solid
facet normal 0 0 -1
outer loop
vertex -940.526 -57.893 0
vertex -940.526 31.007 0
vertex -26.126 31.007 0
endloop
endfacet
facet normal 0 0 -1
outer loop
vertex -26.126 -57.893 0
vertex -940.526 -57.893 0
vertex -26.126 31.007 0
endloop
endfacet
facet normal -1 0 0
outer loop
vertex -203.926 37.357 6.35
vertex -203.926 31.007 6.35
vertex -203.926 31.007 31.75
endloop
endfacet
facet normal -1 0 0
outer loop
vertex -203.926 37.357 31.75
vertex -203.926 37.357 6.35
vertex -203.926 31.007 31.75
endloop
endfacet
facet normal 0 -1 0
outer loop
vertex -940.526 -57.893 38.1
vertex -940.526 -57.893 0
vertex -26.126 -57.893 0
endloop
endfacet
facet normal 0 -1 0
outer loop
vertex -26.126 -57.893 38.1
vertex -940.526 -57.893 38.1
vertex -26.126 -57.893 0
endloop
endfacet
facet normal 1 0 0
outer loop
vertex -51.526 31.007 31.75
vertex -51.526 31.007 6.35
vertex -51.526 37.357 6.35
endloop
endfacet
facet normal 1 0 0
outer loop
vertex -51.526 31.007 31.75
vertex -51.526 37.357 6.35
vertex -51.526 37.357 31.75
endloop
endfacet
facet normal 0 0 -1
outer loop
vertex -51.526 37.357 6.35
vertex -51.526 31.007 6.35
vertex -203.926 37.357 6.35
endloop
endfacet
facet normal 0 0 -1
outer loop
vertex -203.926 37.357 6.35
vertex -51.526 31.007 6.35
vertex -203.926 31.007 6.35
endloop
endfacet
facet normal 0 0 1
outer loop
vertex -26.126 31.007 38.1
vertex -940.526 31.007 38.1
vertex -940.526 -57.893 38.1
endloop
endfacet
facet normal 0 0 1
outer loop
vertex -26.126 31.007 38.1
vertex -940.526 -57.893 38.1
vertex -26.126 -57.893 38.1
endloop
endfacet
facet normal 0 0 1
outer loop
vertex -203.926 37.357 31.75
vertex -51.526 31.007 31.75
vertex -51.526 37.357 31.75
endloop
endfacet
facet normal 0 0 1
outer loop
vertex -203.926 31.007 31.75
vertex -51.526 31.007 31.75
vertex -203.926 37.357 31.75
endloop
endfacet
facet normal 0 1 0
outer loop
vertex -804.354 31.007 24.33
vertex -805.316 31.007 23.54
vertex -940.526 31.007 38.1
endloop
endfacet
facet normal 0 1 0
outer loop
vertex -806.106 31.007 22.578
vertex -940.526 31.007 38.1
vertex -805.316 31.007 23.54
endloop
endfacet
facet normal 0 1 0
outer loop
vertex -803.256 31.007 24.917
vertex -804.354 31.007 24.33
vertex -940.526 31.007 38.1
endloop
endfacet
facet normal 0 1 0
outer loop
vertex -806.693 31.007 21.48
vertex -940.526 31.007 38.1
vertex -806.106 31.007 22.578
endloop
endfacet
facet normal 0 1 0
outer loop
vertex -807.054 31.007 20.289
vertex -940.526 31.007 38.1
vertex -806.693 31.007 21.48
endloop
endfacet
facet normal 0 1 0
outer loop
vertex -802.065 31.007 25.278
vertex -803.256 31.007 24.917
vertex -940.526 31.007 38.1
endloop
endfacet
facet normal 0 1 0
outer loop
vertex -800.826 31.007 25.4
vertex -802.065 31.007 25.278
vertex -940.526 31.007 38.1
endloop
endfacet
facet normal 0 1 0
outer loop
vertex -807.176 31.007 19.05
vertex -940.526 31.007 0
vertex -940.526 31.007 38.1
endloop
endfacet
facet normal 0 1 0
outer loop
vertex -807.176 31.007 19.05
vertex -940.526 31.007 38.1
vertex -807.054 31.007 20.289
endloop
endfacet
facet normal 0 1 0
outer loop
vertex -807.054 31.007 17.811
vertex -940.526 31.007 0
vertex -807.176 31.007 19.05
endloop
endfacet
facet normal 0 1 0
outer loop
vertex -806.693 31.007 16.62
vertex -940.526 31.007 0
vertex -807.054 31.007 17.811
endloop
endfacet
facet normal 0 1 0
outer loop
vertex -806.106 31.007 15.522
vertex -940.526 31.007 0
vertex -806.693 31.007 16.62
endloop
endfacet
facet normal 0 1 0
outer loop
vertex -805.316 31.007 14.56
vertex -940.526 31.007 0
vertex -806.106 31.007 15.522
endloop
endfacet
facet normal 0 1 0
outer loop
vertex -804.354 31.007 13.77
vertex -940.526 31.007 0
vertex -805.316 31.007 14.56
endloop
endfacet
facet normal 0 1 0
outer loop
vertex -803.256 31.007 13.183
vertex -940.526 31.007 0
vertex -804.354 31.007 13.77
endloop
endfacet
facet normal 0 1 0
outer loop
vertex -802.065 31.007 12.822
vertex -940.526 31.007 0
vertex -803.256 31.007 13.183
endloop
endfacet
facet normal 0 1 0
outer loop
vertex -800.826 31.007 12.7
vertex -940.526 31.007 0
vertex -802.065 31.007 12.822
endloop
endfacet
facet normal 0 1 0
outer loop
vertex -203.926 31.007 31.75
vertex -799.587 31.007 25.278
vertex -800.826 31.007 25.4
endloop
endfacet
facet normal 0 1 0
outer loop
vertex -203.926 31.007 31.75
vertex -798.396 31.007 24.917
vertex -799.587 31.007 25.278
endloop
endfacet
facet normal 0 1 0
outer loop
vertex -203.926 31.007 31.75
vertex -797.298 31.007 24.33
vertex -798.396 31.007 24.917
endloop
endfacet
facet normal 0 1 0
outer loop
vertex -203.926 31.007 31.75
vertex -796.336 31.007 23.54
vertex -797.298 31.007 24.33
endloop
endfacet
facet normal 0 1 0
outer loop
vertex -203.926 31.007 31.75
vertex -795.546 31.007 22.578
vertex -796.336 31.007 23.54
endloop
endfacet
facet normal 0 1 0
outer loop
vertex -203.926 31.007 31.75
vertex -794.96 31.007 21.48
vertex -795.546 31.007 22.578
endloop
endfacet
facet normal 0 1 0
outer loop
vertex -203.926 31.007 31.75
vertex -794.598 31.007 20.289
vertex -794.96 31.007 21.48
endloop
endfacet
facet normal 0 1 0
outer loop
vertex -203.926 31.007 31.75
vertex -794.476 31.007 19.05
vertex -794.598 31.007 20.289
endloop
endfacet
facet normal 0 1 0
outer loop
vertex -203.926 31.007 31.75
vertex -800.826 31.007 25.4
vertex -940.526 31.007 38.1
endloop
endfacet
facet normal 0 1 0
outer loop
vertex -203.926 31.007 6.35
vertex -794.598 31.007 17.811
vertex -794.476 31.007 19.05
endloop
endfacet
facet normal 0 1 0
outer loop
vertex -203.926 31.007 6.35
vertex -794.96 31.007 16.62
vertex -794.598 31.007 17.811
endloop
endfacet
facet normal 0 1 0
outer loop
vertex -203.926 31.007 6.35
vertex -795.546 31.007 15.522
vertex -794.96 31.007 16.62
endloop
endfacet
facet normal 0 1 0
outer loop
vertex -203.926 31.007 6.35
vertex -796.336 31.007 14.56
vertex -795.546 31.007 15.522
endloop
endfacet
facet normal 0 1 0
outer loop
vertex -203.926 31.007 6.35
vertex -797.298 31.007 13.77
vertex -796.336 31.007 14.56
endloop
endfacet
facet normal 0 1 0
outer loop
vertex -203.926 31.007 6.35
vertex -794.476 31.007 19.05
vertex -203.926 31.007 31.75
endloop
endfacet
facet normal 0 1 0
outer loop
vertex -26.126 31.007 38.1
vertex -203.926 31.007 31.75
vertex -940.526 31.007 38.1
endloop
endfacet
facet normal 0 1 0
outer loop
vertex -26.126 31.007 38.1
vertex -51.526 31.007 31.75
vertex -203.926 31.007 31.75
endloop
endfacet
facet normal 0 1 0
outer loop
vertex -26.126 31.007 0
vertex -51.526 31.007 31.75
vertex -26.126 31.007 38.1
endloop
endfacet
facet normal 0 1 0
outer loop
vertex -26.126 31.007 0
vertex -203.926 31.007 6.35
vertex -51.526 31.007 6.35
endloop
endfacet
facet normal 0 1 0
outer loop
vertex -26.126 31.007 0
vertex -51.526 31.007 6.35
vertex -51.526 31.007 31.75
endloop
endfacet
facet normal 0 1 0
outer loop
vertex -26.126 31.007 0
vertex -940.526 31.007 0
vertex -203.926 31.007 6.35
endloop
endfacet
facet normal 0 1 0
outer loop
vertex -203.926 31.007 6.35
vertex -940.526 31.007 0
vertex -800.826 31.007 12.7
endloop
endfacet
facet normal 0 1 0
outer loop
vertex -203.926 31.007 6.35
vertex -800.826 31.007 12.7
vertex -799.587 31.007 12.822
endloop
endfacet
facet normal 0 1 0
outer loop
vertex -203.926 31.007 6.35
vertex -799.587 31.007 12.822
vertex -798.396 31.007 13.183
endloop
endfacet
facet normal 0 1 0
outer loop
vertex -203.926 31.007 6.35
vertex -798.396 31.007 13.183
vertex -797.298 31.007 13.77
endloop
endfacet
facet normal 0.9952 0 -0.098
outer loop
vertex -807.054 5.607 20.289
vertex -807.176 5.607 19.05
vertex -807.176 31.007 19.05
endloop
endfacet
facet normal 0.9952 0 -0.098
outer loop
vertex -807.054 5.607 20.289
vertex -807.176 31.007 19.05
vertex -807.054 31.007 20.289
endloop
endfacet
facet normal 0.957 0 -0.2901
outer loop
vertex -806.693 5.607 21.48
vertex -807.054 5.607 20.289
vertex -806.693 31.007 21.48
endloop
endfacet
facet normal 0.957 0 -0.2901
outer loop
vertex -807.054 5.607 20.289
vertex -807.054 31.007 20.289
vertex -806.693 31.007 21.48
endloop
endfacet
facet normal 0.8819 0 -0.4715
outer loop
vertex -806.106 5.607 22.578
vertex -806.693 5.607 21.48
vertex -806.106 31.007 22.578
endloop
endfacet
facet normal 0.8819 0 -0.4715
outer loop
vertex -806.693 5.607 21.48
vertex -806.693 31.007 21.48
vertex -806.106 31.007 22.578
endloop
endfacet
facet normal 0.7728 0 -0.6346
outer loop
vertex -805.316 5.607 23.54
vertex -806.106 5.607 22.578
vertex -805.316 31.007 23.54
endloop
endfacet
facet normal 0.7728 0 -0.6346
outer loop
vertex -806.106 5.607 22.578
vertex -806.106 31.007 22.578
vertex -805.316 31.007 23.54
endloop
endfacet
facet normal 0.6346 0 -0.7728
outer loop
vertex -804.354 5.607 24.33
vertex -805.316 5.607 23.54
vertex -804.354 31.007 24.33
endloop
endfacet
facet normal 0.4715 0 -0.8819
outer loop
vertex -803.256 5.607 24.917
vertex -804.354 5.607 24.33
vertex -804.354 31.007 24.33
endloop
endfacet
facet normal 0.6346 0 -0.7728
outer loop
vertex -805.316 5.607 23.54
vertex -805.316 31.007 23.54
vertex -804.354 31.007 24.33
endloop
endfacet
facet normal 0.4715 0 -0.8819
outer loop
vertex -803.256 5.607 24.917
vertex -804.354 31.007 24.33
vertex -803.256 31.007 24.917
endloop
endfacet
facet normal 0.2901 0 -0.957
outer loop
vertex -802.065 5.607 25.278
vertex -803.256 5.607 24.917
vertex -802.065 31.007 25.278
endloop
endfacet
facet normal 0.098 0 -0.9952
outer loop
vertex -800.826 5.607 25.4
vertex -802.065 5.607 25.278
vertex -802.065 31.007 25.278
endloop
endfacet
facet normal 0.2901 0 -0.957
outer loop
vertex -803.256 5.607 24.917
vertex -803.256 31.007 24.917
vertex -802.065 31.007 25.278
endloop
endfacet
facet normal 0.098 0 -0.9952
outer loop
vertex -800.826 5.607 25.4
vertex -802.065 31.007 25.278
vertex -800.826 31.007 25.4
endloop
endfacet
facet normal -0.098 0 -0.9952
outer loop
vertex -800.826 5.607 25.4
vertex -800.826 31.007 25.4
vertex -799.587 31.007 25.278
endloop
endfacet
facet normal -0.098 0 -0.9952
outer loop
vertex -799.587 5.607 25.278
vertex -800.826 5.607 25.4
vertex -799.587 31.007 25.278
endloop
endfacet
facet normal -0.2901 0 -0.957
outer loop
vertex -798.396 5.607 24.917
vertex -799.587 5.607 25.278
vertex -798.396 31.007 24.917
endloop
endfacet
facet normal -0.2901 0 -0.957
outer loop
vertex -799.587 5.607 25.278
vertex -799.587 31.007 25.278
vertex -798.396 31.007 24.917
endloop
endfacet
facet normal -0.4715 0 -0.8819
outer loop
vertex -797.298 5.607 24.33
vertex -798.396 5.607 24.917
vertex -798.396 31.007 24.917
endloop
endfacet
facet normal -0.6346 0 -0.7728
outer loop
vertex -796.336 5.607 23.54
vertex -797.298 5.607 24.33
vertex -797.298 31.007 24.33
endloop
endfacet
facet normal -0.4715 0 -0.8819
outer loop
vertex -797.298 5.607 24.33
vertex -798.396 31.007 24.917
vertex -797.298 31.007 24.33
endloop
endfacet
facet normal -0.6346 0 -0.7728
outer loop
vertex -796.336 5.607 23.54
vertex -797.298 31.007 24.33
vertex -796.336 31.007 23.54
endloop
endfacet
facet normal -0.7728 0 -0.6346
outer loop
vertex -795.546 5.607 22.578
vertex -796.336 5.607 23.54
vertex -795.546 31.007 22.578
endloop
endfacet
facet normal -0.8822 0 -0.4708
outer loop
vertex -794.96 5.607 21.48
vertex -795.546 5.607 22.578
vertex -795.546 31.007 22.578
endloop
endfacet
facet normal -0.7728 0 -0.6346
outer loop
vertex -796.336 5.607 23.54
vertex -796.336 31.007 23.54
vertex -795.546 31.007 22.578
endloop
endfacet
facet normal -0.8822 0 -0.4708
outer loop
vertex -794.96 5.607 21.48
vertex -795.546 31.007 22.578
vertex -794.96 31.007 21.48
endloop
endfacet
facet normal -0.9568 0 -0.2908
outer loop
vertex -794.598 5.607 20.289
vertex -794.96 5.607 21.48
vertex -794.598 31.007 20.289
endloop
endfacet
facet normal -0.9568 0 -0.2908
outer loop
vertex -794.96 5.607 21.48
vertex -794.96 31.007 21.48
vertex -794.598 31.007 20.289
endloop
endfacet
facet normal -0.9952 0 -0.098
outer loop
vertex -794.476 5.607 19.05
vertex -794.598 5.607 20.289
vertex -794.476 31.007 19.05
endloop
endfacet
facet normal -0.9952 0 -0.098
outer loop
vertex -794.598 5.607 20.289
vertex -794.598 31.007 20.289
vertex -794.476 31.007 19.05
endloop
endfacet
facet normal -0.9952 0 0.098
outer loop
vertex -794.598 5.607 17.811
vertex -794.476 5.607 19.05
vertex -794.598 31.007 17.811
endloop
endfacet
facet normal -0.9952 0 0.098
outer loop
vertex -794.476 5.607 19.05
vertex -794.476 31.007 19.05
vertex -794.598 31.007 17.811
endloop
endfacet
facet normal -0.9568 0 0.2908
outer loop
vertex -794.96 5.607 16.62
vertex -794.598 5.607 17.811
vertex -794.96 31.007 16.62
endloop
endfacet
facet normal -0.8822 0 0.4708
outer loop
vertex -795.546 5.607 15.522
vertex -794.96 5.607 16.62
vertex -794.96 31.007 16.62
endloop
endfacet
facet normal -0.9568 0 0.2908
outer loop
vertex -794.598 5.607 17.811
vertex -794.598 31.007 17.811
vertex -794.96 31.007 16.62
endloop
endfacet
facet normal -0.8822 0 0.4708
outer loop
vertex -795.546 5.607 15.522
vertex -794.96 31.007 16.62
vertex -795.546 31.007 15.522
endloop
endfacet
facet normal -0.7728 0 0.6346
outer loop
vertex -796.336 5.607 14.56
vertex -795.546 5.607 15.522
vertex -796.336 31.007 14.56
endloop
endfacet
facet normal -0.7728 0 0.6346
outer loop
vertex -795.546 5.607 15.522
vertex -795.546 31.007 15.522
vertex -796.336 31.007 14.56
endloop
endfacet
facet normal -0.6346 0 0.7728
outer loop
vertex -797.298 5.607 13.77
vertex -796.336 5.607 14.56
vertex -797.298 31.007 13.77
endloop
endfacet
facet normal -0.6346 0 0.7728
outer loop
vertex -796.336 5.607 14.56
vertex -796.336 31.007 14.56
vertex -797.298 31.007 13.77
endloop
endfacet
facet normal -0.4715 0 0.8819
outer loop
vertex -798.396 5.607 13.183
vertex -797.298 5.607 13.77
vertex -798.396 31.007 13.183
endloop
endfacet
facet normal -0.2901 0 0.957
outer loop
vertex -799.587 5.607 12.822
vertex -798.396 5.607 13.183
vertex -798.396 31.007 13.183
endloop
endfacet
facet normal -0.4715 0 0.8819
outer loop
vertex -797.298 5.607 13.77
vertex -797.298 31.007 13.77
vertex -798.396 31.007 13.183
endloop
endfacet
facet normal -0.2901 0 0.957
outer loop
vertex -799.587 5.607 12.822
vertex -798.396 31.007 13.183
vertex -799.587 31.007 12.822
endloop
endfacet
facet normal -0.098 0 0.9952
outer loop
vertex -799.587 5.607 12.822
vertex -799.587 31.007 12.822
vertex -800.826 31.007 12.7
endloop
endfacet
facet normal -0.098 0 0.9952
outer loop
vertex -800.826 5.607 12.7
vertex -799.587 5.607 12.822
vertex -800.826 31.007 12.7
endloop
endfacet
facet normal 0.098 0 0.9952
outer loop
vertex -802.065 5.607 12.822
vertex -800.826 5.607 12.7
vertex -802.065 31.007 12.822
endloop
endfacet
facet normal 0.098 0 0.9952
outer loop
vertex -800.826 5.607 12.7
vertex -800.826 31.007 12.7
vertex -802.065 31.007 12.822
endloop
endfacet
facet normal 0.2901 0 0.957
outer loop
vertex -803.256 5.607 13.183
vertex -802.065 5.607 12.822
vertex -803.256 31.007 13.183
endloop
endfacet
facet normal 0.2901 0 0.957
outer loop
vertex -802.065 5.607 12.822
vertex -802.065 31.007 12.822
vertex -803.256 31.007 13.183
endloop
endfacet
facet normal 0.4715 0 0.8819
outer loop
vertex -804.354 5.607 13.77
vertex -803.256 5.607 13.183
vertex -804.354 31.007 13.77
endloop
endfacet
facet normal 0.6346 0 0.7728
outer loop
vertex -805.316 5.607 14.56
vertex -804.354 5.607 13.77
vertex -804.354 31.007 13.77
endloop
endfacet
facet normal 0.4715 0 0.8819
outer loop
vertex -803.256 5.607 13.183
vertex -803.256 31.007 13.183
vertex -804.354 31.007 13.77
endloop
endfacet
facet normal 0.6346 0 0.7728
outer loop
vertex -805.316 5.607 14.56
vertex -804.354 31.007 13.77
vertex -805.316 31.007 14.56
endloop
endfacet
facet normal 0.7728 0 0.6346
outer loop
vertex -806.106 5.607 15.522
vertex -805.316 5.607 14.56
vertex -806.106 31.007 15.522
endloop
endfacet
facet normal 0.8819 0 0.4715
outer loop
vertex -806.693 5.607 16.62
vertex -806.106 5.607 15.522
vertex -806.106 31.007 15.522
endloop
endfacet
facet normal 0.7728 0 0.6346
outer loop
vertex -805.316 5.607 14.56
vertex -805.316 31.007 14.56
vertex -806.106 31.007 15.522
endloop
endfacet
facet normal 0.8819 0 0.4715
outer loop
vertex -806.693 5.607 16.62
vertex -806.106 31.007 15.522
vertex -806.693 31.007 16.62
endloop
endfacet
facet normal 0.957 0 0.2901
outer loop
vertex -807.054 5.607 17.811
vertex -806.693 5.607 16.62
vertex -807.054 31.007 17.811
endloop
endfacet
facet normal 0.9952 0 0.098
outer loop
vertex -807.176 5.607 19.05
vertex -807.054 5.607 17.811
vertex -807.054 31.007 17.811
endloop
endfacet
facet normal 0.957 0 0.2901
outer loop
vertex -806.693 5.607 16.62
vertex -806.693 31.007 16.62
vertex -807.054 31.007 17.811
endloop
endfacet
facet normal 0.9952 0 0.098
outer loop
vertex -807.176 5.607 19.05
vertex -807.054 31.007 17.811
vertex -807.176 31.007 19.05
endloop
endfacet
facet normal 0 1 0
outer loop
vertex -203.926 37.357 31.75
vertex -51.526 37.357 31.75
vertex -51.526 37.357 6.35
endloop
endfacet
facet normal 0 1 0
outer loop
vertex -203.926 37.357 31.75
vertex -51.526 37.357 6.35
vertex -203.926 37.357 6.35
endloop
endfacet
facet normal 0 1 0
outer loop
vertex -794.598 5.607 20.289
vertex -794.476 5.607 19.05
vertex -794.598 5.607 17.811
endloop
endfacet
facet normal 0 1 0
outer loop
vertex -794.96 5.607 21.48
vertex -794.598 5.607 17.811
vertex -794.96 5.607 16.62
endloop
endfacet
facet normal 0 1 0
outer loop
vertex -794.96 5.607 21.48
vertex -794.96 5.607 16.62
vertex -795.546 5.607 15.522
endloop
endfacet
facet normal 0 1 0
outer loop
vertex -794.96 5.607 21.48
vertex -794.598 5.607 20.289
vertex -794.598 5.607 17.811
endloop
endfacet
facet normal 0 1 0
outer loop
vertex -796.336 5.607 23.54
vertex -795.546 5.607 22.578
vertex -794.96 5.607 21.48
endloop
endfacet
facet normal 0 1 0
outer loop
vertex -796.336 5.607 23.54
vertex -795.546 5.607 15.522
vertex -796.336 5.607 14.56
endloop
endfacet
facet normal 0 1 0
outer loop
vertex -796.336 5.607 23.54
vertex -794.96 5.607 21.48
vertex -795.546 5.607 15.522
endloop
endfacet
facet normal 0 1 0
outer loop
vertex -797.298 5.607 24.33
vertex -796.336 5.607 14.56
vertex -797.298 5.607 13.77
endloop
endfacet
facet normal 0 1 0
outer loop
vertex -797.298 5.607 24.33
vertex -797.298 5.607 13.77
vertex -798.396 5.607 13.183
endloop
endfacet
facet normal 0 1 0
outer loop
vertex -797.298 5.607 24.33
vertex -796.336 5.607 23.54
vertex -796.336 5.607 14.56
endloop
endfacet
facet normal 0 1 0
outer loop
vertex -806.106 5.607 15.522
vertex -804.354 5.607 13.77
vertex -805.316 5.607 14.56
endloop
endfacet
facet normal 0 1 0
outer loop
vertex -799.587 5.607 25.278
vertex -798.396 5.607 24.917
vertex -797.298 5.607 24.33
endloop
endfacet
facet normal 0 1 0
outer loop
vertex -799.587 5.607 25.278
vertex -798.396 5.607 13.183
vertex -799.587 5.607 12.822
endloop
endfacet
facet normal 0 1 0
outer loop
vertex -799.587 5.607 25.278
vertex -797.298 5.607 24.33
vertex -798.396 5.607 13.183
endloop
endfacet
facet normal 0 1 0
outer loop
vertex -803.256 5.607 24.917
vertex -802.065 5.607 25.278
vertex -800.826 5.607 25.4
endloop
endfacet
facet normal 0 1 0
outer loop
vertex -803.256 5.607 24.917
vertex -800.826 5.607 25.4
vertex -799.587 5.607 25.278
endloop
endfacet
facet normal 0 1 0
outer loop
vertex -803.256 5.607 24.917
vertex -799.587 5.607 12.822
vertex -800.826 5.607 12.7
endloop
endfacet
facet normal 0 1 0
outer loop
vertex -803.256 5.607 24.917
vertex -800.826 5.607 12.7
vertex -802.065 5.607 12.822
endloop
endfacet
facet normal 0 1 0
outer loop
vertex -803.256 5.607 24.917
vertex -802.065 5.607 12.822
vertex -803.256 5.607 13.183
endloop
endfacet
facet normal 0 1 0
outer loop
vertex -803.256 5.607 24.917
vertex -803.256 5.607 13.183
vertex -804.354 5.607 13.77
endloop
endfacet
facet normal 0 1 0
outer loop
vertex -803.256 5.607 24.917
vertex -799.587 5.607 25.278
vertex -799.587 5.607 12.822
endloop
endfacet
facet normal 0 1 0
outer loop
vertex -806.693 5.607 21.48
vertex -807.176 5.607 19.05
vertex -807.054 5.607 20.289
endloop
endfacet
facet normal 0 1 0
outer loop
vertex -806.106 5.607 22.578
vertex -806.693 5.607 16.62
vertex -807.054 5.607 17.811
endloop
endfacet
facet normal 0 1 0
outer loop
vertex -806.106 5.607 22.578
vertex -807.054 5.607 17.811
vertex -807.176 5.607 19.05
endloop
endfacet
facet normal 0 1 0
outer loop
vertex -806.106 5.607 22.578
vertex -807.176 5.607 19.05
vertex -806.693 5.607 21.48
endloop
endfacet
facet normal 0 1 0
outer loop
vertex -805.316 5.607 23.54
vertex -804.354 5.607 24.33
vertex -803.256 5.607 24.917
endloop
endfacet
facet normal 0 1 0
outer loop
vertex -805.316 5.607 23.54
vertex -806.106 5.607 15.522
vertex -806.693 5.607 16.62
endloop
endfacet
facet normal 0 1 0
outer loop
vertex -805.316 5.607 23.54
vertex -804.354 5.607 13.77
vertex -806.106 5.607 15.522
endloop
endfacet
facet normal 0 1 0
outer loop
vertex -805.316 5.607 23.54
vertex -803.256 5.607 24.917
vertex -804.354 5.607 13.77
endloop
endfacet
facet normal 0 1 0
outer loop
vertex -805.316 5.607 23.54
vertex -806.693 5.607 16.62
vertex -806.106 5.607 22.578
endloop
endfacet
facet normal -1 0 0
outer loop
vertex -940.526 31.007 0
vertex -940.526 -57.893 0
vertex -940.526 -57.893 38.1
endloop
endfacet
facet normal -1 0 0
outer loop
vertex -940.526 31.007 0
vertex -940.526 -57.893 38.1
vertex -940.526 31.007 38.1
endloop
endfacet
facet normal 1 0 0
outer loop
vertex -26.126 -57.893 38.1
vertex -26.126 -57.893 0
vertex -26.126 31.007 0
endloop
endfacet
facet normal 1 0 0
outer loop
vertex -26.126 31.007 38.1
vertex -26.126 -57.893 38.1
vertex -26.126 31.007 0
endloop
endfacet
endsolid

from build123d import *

# Parameters (mm, degrees)
F0_W     = 914.4
F0_H     = 88.9
F1_DEPTH = 38.1
F2_W     = 152.4
F2_H     = 25.4
F3_DEPTH = 6.35
F4_R     = 6.35
F5_DEPTH = 25.4


with BuildPart() as f1:
    # F0 (on Top) → F1 (new body)
    with BuildSketch(Plane.XY):
        with Locations((-483.326185, -13.443414)):
            Rectangle(F0_W, F0_H)
    extrude(amount=F1_DEPTH)

    # F2 (on face) → F3 (join)
    with BuildSketch(Plane(origin=(0, 31.006586, 0), x_dir=(-1, 0, 0), z_dir=(0, 1, 0))):
        with Locations((127.726185, 19.05)):
            Rectangle(F2_W, F2_H)
    extrude(amount=F3_DEPTH)

    # F4 (on face) → F5 (cut)
    with BuildSketch(Plane(origin=(0, 31.006586, 0), x_dir=(-1, 0, 0), z_dir=(0, 1, 0))):
        with Locations((800.826185, 19.05)):
            Circle(F4_R)
    extrude(amount=-F5_DEPTH, mode=Mode.SUBTRACT)


solid = f1.part
